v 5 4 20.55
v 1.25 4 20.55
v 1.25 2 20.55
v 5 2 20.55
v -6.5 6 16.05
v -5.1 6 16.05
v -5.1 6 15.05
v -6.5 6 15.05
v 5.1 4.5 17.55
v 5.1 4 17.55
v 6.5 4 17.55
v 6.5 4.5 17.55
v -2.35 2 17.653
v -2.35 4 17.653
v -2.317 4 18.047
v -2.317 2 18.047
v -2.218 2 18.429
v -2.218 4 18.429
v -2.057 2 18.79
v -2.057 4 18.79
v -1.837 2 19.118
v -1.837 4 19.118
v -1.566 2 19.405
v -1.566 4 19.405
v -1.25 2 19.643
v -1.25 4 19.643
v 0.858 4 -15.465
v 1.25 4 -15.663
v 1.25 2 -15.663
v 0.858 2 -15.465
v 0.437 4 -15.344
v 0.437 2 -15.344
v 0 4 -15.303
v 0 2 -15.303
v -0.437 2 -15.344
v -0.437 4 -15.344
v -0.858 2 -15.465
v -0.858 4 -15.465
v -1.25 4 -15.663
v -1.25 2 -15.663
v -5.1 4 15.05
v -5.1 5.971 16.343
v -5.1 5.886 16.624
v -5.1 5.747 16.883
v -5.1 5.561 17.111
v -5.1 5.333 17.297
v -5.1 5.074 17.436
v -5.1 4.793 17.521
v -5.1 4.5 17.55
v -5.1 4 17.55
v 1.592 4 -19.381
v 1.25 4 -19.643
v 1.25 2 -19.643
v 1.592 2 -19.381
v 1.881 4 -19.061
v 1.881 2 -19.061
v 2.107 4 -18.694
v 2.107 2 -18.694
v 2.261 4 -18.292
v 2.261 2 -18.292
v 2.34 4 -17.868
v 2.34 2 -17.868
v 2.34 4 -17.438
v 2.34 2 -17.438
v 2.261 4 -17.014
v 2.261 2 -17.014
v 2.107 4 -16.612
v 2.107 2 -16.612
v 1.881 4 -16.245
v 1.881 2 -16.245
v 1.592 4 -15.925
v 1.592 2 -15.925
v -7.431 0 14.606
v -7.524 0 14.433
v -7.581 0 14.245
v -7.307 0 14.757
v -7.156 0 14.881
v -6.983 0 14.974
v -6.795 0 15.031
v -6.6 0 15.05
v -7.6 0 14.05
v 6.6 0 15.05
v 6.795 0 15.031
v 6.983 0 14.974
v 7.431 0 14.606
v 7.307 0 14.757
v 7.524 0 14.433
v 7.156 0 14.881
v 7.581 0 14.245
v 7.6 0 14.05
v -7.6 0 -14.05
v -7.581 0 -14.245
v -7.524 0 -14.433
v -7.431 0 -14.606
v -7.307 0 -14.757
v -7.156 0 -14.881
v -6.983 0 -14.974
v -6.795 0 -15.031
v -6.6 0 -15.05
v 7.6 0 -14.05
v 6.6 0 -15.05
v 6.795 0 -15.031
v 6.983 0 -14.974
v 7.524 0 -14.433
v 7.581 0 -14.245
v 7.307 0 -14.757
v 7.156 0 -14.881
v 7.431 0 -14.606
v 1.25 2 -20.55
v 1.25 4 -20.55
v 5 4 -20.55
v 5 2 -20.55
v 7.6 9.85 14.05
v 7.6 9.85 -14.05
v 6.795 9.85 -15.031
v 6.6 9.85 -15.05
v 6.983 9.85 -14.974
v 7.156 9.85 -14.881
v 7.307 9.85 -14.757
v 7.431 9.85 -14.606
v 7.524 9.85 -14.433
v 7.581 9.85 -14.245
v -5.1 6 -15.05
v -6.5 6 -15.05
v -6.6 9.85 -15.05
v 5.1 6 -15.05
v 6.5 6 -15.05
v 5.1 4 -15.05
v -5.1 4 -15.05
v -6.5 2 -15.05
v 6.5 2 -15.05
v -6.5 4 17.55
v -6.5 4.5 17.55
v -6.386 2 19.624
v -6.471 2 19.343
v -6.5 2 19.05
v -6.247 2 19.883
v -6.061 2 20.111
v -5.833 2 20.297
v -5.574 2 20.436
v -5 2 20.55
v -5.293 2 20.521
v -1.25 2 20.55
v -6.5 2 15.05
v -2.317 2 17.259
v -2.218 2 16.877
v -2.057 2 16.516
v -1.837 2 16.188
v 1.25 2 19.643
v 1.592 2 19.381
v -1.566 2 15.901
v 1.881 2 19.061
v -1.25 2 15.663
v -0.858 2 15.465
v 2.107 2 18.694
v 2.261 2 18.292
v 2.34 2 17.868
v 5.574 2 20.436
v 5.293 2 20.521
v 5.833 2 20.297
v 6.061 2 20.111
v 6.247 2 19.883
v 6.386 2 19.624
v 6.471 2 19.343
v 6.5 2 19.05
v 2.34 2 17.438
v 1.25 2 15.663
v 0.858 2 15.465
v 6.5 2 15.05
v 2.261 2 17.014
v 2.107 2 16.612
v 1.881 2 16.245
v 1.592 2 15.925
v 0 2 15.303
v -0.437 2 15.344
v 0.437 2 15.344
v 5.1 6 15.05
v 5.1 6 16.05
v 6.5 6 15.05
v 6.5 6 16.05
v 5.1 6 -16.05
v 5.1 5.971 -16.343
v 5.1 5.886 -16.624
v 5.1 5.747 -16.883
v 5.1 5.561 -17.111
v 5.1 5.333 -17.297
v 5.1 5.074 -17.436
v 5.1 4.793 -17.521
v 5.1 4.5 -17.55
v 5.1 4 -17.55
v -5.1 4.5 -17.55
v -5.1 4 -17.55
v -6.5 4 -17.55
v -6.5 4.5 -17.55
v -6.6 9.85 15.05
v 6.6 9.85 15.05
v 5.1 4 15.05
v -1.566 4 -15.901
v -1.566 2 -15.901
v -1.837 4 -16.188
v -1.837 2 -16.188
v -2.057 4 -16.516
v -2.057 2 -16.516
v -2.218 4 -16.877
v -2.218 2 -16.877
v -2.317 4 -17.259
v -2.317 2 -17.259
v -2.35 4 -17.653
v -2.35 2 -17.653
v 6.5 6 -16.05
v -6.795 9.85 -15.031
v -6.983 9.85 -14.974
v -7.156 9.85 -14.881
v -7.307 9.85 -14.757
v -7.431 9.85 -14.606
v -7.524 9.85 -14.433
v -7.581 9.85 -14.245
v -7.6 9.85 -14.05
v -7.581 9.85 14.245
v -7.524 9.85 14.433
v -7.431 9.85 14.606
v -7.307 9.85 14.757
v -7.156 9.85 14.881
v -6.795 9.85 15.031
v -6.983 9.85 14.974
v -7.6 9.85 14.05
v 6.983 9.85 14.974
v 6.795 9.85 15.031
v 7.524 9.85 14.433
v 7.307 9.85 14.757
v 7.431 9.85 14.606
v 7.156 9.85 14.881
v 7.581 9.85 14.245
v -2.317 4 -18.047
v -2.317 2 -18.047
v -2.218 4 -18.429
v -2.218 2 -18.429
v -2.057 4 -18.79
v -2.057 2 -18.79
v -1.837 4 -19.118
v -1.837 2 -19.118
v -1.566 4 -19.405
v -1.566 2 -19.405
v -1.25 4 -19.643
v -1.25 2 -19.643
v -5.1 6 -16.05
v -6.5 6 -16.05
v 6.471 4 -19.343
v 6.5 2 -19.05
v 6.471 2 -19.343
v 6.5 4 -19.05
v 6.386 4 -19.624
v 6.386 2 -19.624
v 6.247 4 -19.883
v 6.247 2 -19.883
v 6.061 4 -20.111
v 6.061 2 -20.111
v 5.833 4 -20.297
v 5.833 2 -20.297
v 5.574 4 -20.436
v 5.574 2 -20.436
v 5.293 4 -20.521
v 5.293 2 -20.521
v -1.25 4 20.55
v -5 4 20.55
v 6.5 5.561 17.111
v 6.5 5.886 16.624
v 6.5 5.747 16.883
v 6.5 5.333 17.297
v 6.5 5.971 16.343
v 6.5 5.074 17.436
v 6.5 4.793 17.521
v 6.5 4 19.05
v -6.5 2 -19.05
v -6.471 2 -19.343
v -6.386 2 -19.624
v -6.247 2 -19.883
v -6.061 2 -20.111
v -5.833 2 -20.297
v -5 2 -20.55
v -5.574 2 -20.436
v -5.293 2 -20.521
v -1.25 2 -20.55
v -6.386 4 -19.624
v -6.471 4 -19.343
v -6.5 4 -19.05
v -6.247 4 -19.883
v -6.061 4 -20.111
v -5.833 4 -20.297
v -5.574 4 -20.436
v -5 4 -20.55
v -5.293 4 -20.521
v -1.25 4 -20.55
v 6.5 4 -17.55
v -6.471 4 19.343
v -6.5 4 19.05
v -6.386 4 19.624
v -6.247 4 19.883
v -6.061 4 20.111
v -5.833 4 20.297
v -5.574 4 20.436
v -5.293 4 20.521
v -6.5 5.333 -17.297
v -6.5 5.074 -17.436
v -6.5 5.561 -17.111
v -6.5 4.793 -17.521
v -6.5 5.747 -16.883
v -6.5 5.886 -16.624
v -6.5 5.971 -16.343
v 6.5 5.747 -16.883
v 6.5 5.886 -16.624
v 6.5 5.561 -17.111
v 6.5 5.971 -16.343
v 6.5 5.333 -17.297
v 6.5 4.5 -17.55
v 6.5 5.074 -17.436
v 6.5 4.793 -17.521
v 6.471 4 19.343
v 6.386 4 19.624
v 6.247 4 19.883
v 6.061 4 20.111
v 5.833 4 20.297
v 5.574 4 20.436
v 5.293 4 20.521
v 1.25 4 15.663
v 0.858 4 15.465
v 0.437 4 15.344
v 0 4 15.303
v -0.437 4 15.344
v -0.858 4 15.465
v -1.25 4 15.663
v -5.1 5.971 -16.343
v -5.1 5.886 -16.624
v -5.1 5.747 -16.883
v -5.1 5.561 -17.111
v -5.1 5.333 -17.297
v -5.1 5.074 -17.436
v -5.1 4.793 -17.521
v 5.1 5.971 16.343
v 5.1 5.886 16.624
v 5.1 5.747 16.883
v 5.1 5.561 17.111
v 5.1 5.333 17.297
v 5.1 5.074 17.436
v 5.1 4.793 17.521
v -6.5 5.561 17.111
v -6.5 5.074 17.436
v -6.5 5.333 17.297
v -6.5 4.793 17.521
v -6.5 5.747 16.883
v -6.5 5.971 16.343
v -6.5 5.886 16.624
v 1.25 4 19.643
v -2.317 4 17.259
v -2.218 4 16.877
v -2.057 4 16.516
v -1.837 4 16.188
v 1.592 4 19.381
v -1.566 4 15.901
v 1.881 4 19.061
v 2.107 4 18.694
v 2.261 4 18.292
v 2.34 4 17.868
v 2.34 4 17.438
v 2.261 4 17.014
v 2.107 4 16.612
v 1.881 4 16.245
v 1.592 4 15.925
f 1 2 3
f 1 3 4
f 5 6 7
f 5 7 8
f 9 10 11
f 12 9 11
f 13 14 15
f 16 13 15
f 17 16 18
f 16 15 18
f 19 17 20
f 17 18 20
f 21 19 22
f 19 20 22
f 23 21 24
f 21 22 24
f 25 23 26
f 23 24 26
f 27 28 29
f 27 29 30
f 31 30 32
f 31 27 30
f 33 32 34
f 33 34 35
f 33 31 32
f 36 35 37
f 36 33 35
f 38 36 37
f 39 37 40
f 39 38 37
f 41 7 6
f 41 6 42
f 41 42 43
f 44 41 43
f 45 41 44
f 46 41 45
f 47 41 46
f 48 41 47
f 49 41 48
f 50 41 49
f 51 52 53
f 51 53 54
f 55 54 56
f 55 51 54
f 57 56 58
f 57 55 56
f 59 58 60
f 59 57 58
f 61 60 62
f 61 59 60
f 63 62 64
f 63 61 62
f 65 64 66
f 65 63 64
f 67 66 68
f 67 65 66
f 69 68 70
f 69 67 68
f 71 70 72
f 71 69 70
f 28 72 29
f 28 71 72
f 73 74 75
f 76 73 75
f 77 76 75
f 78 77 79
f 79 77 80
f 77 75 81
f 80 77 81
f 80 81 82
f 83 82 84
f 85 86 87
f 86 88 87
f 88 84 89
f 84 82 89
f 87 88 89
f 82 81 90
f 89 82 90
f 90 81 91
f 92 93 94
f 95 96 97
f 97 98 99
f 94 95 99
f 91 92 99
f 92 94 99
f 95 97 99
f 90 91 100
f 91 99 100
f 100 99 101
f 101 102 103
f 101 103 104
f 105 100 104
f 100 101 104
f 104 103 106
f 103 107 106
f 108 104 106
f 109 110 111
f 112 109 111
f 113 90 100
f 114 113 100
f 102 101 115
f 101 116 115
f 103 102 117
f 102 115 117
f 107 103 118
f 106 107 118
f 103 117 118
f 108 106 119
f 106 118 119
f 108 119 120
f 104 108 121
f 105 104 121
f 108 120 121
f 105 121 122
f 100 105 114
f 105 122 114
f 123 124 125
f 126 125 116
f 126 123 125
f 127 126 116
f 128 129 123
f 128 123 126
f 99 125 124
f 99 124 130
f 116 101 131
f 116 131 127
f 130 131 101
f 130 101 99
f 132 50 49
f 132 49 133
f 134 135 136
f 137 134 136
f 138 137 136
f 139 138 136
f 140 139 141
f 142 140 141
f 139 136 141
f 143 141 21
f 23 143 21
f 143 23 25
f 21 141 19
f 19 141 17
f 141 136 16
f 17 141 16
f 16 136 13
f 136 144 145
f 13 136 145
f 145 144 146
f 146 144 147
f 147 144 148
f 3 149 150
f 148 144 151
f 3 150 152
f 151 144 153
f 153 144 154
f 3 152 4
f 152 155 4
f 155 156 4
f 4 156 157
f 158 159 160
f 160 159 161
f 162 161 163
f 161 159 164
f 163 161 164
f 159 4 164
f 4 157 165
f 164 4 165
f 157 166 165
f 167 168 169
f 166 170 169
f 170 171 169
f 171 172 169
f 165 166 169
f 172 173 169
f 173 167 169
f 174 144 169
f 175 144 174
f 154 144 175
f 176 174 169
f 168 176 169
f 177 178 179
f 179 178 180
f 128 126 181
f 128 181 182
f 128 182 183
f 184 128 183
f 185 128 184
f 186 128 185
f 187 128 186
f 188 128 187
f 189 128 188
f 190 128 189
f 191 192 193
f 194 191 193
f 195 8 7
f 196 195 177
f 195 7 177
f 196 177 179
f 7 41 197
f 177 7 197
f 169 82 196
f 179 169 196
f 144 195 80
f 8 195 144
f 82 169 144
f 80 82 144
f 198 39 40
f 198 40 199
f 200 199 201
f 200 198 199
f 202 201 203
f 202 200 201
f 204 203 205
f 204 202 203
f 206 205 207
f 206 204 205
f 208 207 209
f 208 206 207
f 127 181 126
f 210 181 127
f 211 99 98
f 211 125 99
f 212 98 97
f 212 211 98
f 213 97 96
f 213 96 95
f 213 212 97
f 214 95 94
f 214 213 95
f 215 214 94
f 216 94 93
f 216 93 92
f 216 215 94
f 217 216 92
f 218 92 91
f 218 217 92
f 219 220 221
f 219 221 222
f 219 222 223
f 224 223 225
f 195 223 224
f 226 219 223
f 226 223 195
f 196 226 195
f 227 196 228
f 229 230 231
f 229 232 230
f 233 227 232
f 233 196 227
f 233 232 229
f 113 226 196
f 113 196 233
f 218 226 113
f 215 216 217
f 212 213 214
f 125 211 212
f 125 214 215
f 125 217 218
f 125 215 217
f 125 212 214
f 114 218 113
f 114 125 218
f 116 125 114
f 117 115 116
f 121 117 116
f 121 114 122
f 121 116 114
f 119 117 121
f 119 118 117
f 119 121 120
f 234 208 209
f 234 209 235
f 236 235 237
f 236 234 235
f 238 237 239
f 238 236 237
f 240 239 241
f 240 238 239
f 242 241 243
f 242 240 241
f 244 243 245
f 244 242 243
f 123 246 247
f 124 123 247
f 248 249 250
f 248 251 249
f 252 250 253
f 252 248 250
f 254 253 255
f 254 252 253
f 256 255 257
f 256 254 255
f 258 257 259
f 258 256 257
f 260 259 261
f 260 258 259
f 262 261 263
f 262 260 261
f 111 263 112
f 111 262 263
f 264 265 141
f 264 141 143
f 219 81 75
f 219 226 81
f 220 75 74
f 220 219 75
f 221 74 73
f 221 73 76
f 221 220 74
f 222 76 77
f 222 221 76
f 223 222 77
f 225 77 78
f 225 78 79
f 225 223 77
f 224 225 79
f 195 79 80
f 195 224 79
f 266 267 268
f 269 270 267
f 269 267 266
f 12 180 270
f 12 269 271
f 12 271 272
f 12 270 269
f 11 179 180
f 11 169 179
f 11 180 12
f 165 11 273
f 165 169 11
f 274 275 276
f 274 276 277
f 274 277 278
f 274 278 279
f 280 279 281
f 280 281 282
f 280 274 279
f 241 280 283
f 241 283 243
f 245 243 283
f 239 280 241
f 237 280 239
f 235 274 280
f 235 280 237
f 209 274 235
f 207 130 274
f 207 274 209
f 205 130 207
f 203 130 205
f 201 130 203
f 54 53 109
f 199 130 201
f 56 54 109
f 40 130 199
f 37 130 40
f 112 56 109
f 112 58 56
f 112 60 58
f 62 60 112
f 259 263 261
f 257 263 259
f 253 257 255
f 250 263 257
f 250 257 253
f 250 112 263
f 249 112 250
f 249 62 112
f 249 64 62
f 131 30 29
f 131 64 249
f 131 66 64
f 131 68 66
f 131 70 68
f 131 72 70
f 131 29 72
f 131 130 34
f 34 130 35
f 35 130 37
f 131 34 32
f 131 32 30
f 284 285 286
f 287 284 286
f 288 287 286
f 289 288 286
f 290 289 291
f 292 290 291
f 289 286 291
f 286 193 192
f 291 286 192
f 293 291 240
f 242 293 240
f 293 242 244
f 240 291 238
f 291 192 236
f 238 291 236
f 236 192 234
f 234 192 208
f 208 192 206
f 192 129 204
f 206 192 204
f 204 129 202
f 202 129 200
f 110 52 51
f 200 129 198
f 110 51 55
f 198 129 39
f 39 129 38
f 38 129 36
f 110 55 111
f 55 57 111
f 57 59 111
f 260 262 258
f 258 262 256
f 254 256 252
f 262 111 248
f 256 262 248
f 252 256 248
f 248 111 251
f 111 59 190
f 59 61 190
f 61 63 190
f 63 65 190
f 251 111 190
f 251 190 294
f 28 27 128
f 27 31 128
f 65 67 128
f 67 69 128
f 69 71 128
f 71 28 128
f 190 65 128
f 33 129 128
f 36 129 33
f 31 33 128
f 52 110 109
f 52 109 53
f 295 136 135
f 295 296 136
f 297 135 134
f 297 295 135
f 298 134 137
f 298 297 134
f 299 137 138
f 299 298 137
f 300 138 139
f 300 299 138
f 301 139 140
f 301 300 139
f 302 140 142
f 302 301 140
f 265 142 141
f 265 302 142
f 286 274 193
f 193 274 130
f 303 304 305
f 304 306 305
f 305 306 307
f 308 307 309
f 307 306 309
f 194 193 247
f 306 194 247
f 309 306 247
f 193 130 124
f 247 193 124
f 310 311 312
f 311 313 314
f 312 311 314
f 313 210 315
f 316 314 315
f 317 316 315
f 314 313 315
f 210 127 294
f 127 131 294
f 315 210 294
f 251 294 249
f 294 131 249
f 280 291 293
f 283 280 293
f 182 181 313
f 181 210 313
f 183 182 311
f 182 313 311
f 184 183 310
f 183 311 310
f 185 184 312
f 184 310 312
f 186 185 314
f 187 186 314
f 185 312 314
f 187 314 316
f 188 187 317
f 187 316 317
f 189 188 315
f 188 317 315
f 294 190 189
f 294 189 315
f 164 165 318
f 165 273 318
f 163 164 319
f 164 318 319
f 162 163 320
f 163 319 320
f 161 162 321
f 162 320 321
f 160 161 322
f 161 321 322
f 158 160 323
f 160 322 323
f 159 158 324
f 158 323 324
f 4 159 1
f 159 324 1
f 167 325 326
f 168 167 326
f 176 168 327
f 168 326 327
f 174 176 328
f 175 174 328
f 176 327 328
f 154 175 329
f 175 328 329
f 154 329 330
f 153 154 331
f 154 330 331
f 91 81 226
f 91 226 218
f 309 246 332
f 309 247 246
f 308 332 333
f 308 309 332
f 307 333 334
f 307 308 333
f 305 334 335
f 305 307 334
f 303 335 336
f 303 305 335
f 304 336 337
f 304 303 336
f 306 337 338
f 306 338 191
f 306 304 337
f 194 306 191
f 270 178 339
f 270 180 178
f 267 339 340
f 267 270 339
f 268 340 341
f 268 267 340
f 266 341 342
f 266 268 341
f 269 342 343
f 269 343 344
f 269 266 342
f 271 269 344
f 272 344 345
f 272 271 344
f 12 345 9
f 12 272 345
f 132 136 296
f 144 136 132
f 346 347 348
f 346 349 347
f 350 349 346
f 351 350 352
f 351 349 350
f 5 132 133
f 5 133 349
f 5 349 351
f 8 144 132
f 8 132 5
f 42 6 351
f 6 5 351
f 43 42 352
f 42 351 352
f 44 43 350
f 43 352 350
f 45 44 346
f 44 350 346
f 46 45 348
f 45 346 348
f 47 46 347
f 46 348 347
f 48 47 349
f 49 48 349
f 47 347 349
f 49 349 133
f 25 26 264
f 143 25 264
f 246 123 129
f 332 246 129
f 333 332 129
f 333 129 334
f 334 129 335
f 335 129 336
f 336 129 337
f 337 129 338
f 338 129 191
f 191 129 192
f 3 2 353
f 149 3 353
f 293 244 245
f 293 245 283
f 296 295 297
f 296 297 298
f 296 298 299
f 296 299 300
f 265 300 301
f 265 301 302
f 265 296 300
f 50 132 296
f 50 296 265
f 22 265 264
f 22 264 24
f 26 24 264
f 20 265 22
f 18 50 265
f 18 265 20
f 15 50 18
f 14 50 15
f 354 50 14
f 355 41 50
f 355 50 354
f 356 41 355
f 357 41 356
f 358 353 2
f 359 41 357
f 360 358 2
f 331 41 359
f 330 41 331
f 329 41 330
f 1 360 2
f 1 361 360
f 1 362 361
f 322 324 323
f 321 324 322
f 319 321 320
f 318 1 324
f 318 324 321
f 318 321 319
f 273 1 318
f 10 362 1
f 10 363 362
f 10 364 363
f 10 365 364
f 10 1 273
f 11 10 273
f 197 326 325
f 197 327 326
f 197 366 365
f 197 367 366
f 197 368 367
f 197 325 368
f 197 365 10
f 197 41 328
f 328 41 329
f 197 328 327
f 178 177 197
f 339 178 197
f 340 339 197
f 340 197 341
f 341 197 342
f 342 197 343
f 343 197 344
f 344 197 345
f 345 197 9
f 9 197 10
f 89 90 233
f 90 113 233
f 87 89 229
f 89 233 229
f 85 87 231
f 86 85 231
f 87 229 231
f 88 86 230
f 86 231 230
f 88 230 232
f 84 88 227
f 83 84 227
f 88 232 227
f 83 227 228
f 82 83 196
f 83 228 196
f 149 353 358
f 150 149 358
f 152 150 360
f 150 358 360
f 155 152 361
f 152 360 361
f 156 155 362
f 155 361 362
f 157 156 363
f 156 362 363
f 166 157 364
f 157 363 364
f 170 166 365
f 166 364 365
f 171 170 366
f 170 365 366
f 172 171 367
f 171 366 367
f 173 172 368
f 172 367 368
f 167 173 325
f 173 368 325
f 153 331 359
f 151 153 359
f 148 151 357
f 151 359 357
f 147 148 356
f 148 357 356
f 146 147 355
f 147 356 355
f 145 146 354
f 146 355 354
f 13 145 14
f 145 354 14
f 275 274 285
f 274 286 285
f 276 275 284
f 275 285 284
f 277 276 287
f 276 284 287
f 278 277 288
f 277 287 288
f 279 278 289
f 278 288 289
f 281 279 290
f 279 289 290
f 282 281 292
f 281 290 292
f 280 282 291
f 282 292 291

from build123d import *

# Parameters (mm, degrees)
SKETCH1_W            = 15.2
SKETCH1_H            = 30.1
BOSS_EXTRUDE1_DEPTH  = 9.85
SKETCH2_W            = 13
SKETCH2_H            = 2
BOSS_EXTRUDE2_DEPTH  = 5.5
CUT_EXTRUDE2_DEPTH   = 23.677852632
FILLET1_R            = 1.5
SKETCH4_W            = 1.4
SKETCH4_H            = 2.5
BOSS_EXTRUDE3_DEPTH  = 2
FILLET3_R            = 1.5
FILLET3_OF_MIRROR1_R = 1.5
FILLET4_R            = 1


# Read off the part's stored shape, not the designer's step: Mirror2
with BuildPart() as part:
    # Sketch1 → Boss-Extrude1 (new body)
    with BuildSketch(Plane(origin=(0, 0, 0), x_dir=(1, 0, 0), z_dir=(0, 1, 0))):
        Rectangle(SKETCH1_W, SKETCH1_H)
    extrude(amount=BOSS_EXTRUDE1_DEPTH)

    # Sketch2 → Boss-Extrude2 (add)
    with BuildSketch(Plane.XY.offset(15.05)):
        with Locations((0, 3)):
            Rectangle(SKETCH2_W, SKETCH2_H)
    extrude(amount=BOSS_EXTRUDE2_DEPTH)

    # Sketch3 → Cut-Extrude2 (cut, through all)
    with BuildSketch(Plane(origin=(0, 4, 0), x_dir=(-1, 0, 0), z_dir=(0, 1, 0))):
        with BuildLine():
            Line((-1.25, 15.663025126), (-1.25, 17.653))
            Line((-1.25, 17.653), (-1.25, 19.642974874))
            ThreePointArc((-1.25, 19.642974874), (-2.35, 17.653), (-1.25, 15.663025126))
        make_face()
        with BuildLine():
            Line((-1.25, 19.642974874), (-1.25, 17.653))
            Line((-1.25, 17.653), (1.25, 17.653))
            Line((1.25, 17.653), (1.25, 19.642974874))
            ThreePointArc((1.25, 19.642974874), (0, 20.003), (-1.25, 19.642974874))
        make_face()
        with BuildLine():
            Line((1.25, 17.653), (-1.25, 17.653))
            Line((-1.25, 17.653), (-1.25, 15.663025126))
            ThreePointArc((-1.25, 15.663025126), (0, 15.303), (1.25, 15.663025126))
            Line((1.25, 15.663025126), (1.25, 17.653))
        make_face()
        with BuildLine():
            Line((1.25, 19.642974874), (1.25, 17.653))
            Line((1.25, 17.653), (1.25, 15.663025126))
            ThreePointArc((1.25, 15.663025126), (2.05669638, 16.5161183), (2.35, 17.653))
            ThreePointArc((2.35, 17.653), (2.05669638, 18.7898817), (1.25, 19.642974874))
        make_face()
        with BuildLine():
            Line((-1.25, 20.55), (-1.25, 19.642974874))
            ThreePointArc((-1.25, 19.642974874), (0, 20.003), (1.25, 19.642974874))
            Line((1.25, 19.642974874), (1.25, 20.55))
            Line((1.25, 20.55), (-1.25, 20.55))
        make_face()
    extrude(amount=-CUT_EXTRUDE2_DEPTH, mode=Mode.SUBTRACT)

    # Fillet1
    fillet1_edges = [part.edges().sort_by_distance(p)[0] for p in [
        (6.5, 3, 20.55),
        (-6.5, 3, 20.55),
    ]]
    fillet(fillet1_edges, radius=FILLET1_R)

    # Sketch4 → Boss-Extrude3 (add)
    with BuildSketch(Plane(origin=(0, 4, 0), x_dir=(-1, 0, 0), z_dir=(0, 1, 0))):
        with Locations((5.8, 16.3)):
            Rectangle(SKETCH4_W, SKETCH4_H)
    boss_extrude3 = extrude(amount=BOSS_EXTRUDE3_DEPTH)

    # Fillet3
    fillet3_edges = [part.edges().sort_by_distance(p)[0] for p in [
        (-5.8, 6, 17.55),
    ]]
    fillet(fillet3_edges, radius=FILLET3_R)

    # Mirror1: Boss-Extrude3 across plane
    add(boss_extrude3.mirror(Plane(origin=(0, 0, 0), x_dir=(0, 0, 1), z_dir=(1, 0, 0))))

    # Fillet3 of Mirror1
    fillet3_of_mirror1_edges = [part.edges().sort_by_distance(p)[0] for p in [
        (5.8, 6, 17.55),
    ]]
    fillet(fillet3_of_mirror1_edges, radius=FILLET3_OF_MIRROR1_R)

    # Mirror2: part across plane


with BuildPart() as part_1:
    add(part.part)
    add(part.part.mirror(Plane.XY))

    # Fillet4
    fillet4_edges = [part_1.edges().sort_by_distance(p)[0] for p in [
        (-7.6, 4.925, -15.05),
        (7.6, 4.925, -15.05),
        (7.6, 4.925, 15.05),
        (-7.6, 4.925, 15.05),
    ]]
    fillet(fillet4_edges, radius=FILLET4_R)


solid = part_1.part
